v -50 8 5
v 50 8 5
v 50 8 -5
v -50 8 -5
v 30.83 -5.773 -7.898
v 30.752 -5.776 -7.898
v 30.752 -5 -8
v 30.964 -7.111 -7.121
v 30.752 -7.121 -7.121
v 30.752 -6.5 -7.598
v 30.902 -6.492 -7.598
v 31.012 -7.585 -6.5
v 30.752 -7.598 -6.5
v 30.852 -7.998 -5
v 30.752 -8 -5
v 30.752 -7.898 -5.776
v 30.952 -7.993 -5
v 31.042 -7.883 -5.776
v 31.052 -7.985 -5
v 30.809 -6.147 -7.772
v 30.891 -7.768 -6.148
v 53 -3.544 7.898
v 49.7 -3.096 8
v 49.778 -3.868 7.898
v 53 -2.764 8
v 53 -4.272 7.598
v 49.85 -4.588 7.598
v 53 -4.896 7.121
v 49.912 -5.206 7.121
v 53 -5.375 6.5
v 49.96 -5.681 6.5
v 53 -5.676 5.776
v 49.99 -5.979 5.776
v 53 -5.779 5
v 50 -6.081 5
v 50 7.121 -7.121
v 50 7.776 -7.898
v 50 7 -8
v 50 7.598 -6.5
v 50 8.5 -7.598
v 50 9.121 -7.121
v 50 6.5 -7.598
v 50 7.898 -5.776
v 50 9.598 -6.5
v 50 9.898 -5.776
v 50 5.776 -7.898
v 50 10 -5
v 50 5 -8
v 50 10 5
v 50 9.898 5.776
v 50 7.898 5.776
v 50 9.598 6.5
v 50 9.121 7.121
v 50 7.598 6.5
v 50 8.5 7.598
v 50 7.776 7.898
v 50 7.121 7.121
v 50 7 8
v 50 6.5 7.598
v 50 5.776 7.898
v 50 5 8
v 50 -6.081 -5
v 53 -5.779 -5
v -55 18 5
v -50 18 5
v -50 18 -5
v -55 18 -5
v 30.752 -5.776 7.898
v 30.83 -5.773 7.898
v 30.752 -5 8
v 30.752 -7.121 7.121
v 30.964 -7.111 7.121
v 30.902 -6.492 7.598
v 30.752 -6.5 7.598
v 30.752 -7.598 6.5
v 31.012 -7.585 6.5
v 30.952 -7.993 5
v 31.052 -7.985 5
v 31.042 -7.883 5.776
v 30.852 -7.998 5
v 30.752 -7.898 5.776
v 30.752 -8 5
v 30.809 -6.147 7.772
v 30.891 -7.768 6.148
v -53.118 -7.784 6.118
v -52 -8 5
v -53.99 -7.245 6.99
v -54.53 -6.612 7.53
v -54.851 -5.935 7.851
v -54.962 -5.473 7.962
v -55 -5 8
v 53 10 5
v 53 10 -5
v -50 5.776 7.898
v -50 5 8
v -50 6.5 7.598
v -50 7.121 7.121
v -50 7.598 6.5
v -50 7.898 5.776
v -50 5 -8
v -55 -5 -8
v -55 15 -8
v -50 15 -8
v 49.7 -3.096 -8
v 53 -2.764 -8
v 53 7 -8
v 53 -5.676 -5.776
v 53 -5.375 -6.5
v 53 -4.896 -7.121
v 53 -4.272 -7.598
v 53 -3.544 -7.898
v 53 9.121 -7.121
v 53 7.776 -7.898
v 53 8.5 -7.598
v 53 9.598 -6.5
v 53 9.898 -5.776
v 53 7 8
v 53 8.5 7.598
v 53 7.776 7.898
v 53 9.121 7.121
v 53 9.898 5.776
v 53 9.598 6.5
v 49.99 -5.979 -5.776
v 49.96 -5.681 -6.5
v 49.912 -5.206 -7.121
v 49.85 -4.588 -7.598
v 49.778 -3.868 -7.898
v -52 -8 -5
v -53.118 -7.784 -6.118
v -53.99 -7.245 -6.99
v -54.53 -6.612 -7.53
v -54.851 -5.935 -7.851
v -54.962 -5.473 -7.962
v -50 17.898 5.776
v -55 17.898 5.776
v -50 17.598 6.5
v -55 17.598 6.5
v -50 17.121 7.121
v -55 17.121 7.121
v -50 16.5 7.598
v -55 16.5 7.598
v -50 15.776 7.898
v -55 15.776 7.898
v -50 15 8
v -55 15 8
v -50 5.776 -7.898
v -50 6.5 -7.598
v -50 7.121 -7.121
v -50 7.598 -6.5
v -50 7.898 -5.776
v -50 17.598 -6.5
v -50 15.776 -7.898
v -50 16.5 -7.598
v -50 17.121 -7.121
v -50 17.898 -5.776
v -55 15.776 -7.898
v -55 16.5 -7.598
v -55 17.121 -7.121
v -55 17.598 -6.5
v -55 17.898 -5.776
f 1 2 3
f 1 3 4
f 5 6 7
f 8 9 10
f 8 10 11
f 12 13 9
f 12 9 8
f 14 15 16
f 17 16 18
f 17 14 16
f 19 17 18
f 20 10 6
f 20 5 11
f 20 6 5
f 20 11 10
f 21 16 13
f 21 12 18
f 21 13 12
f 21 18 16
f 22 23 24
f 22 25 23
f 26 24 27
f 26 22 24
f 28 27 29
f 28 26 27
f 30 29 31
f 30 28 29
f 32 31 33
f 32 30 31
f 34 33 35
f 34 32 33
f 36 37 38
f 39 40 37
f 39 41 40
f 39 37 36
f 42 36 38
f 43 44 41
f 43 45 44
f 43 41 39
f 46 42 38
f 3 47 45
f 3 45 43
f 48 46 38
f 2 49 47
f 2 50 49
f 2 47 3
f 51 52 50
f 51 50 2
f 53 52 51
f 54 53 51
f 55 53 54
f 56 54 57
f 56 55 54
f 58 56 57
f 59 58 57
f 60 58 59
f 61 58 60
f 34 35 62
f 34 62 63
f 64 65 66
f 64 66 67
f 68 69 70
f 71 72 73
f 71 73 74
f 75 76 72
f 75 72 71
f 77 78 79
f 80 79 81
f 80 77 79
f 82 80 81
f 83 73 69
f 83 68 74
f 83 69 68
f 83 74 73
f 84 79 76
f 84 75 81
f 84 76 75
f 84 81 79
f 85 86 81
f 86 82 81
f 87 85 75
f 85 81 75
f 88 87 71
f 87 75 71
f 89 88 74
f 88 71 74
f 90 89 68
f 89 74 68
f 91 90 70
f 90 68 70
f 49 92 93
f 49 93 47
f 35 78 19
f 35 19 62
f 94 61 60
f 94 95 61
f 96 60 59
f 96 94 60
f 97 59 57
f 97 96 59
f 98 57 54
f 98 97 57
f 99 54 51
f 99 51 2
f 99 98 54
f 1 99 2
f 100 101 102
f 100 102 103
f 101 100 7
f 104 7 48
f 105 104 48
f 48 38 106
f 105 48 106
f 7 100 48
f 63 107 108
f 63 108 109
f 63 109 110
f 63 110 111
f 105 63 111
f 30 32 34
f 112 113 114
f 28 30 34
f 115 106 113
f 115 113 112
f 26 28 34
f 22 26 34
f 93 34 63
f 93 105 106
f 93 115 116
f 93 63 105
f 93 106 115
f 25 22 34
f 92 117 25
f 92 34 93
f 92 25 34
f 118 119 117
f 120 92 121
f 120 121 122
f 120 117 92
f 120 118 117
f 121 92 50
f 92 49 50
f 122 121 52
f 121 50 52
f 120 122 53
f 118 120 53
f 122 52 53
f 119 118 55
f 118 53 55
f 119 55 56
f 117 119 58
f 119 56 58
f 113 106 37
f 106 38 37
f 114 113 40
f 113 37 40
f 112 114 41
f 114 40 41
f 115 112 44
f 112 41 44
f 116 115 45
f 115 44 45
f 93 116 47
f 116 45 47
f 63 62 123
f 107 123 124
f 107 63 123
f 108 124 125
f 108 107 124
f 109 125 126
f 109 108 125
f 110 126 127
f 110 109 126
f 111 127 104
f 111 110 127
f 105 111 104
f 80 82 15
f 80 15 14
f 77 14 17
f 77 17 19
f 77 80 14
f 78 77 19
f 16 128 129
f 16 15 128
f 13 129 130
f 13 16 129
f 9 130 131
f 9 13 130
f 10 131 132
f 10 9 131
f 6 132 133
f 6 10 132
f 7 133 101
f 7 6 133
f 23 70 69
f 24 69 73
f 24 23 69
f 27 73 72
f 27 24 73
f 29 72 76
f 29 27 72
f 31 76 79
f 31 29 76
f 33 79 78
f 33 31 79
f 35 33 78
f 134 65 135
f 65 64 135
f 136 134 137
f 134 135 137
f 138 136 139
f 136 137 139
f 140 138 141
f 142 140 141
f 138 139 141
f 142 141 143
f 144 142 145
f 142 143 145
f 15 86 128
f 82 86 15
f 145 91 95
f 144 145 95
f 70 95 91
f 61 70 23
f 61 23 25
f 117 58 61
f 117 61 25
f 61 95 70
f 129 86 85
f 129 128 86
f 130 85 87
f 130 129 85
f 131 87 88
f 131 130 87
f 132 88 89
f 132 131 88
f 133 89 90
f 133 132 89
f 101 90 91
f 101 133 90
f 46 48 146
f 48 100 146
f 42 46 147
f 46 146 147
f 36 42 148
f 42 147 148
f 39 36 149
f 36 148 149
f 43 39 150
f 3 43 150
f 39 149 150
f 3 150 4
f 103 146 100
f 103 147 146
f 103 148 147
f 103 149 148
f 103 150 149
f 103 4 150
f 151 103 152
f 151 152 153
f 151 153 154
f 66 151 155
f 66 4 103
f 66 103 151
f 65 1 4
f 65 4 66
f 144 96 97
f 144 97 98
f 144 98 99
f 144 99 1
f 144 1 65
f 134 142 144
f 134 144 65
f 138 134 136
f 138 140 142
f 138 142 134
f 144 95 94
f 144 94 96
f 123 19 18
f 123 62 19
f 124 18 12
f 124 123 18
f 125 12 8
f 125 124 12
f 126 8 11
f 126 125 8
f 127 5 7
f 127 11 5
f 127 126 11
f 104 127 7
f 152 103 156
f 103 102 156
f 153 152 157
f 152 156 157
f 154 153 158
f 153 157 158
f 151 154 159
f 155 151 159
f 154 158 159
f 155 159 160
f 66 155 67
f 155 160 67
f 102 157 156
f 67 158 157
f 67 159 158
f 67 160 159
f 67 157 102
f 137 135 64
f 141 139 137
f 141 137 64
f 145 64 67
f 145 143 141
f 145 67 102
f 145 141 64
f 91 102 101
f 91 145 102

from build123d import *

# Parameters (mm, degrees)
F2_DEPTH      = 8
F2_DEPTH_BACK = 8
F3_R          = 3


# Not quite as in the source:
# - two fillets or chamfers of one size are made in one step


with BuildPart() as f2:
    # F1 (on Top) → F2 (new body, two sides)
    with BuildSketch(Plane.XY) as f2_sk:
        Polygon((-55, -8), (-50, -8), (-50, 8), (-50, 18), (-55, 18), align=None)
        Polygon((-50, -8), (30.9022613208, -8), (50, -6.0806050441), (50, 8), (-50, 8), align=None)
        Polygon((50, 8), (50, -6.0806050441), (53, -5.7790936996), (53, 10), (50, 10), align=None)
    extrude(amount=F2_DEPTH)
    extrude(f2_sk.sketch, amount=-F2_DEPTH_BACK)

    # F3 (call 1 of 7: OpenCascade refuses the feature's edges together)
    f3_edges = [f2.edges().sort_by_distance(p)[0] for p in [
        (-12.048869, -8, 8),
        (-55, -8, 0),
        (30.902261, -8, 0),
        (-12.048869, -8, -8),
        (41.951131, -6.889547, 8),
        (41.951131, -6.889547, -8),
    ]]
    fillet(f3_edges, radius=F3_R)

    # F3#2 (call 2 of 7)
    f3_2_edges = [f2.edges().sort_by_distance(p)[0] for p in [
        (-52.5, 18, -8),
    ]]
    fillet(f3_2_edges, radius=F3_R)

    # F3#3 (call 3 of 7)
    f3_3_edges = [f2.edges().sort_by_distance(p)[0] for p in [
        (-52.5, 18, 8),
    ]]
    fillet(f3_3_edges, radius=F3_R)

    # F3#4 (call 4 of 7)
    f3_4_edges = [f2.edges().sort_by_distance(p)[0] for p in [
        (0, 8, 8),
    ]]
    fillet(f3_4_edges, radius=F3_R)

    # F3#5 (call 5 of 7)
    f3_5_edges = [f2.edges().sort_by_distance(p)[0] for p in [
        (0, 8, -8),
    ]]
    fillet(f3_5_edges, radius=F3_R)

    # F3#6 (call 6 of 7)
    f3_6_edges = [f2.edges().sort_by_distance(p)[0] for p in [
        (51.5, 10, -8),
    ]]
    fillet(f3_6_edges, radius=F3_R)

    # F3#7 (call 7 of 7)
    f3_7_edges = [f2.edges().sort_by_distance(p)[0] for p in [
        (51.5, 10, 8),
    ]]
    fillet(f3_7_edges, radius=F3_R)


solid = f2.part
